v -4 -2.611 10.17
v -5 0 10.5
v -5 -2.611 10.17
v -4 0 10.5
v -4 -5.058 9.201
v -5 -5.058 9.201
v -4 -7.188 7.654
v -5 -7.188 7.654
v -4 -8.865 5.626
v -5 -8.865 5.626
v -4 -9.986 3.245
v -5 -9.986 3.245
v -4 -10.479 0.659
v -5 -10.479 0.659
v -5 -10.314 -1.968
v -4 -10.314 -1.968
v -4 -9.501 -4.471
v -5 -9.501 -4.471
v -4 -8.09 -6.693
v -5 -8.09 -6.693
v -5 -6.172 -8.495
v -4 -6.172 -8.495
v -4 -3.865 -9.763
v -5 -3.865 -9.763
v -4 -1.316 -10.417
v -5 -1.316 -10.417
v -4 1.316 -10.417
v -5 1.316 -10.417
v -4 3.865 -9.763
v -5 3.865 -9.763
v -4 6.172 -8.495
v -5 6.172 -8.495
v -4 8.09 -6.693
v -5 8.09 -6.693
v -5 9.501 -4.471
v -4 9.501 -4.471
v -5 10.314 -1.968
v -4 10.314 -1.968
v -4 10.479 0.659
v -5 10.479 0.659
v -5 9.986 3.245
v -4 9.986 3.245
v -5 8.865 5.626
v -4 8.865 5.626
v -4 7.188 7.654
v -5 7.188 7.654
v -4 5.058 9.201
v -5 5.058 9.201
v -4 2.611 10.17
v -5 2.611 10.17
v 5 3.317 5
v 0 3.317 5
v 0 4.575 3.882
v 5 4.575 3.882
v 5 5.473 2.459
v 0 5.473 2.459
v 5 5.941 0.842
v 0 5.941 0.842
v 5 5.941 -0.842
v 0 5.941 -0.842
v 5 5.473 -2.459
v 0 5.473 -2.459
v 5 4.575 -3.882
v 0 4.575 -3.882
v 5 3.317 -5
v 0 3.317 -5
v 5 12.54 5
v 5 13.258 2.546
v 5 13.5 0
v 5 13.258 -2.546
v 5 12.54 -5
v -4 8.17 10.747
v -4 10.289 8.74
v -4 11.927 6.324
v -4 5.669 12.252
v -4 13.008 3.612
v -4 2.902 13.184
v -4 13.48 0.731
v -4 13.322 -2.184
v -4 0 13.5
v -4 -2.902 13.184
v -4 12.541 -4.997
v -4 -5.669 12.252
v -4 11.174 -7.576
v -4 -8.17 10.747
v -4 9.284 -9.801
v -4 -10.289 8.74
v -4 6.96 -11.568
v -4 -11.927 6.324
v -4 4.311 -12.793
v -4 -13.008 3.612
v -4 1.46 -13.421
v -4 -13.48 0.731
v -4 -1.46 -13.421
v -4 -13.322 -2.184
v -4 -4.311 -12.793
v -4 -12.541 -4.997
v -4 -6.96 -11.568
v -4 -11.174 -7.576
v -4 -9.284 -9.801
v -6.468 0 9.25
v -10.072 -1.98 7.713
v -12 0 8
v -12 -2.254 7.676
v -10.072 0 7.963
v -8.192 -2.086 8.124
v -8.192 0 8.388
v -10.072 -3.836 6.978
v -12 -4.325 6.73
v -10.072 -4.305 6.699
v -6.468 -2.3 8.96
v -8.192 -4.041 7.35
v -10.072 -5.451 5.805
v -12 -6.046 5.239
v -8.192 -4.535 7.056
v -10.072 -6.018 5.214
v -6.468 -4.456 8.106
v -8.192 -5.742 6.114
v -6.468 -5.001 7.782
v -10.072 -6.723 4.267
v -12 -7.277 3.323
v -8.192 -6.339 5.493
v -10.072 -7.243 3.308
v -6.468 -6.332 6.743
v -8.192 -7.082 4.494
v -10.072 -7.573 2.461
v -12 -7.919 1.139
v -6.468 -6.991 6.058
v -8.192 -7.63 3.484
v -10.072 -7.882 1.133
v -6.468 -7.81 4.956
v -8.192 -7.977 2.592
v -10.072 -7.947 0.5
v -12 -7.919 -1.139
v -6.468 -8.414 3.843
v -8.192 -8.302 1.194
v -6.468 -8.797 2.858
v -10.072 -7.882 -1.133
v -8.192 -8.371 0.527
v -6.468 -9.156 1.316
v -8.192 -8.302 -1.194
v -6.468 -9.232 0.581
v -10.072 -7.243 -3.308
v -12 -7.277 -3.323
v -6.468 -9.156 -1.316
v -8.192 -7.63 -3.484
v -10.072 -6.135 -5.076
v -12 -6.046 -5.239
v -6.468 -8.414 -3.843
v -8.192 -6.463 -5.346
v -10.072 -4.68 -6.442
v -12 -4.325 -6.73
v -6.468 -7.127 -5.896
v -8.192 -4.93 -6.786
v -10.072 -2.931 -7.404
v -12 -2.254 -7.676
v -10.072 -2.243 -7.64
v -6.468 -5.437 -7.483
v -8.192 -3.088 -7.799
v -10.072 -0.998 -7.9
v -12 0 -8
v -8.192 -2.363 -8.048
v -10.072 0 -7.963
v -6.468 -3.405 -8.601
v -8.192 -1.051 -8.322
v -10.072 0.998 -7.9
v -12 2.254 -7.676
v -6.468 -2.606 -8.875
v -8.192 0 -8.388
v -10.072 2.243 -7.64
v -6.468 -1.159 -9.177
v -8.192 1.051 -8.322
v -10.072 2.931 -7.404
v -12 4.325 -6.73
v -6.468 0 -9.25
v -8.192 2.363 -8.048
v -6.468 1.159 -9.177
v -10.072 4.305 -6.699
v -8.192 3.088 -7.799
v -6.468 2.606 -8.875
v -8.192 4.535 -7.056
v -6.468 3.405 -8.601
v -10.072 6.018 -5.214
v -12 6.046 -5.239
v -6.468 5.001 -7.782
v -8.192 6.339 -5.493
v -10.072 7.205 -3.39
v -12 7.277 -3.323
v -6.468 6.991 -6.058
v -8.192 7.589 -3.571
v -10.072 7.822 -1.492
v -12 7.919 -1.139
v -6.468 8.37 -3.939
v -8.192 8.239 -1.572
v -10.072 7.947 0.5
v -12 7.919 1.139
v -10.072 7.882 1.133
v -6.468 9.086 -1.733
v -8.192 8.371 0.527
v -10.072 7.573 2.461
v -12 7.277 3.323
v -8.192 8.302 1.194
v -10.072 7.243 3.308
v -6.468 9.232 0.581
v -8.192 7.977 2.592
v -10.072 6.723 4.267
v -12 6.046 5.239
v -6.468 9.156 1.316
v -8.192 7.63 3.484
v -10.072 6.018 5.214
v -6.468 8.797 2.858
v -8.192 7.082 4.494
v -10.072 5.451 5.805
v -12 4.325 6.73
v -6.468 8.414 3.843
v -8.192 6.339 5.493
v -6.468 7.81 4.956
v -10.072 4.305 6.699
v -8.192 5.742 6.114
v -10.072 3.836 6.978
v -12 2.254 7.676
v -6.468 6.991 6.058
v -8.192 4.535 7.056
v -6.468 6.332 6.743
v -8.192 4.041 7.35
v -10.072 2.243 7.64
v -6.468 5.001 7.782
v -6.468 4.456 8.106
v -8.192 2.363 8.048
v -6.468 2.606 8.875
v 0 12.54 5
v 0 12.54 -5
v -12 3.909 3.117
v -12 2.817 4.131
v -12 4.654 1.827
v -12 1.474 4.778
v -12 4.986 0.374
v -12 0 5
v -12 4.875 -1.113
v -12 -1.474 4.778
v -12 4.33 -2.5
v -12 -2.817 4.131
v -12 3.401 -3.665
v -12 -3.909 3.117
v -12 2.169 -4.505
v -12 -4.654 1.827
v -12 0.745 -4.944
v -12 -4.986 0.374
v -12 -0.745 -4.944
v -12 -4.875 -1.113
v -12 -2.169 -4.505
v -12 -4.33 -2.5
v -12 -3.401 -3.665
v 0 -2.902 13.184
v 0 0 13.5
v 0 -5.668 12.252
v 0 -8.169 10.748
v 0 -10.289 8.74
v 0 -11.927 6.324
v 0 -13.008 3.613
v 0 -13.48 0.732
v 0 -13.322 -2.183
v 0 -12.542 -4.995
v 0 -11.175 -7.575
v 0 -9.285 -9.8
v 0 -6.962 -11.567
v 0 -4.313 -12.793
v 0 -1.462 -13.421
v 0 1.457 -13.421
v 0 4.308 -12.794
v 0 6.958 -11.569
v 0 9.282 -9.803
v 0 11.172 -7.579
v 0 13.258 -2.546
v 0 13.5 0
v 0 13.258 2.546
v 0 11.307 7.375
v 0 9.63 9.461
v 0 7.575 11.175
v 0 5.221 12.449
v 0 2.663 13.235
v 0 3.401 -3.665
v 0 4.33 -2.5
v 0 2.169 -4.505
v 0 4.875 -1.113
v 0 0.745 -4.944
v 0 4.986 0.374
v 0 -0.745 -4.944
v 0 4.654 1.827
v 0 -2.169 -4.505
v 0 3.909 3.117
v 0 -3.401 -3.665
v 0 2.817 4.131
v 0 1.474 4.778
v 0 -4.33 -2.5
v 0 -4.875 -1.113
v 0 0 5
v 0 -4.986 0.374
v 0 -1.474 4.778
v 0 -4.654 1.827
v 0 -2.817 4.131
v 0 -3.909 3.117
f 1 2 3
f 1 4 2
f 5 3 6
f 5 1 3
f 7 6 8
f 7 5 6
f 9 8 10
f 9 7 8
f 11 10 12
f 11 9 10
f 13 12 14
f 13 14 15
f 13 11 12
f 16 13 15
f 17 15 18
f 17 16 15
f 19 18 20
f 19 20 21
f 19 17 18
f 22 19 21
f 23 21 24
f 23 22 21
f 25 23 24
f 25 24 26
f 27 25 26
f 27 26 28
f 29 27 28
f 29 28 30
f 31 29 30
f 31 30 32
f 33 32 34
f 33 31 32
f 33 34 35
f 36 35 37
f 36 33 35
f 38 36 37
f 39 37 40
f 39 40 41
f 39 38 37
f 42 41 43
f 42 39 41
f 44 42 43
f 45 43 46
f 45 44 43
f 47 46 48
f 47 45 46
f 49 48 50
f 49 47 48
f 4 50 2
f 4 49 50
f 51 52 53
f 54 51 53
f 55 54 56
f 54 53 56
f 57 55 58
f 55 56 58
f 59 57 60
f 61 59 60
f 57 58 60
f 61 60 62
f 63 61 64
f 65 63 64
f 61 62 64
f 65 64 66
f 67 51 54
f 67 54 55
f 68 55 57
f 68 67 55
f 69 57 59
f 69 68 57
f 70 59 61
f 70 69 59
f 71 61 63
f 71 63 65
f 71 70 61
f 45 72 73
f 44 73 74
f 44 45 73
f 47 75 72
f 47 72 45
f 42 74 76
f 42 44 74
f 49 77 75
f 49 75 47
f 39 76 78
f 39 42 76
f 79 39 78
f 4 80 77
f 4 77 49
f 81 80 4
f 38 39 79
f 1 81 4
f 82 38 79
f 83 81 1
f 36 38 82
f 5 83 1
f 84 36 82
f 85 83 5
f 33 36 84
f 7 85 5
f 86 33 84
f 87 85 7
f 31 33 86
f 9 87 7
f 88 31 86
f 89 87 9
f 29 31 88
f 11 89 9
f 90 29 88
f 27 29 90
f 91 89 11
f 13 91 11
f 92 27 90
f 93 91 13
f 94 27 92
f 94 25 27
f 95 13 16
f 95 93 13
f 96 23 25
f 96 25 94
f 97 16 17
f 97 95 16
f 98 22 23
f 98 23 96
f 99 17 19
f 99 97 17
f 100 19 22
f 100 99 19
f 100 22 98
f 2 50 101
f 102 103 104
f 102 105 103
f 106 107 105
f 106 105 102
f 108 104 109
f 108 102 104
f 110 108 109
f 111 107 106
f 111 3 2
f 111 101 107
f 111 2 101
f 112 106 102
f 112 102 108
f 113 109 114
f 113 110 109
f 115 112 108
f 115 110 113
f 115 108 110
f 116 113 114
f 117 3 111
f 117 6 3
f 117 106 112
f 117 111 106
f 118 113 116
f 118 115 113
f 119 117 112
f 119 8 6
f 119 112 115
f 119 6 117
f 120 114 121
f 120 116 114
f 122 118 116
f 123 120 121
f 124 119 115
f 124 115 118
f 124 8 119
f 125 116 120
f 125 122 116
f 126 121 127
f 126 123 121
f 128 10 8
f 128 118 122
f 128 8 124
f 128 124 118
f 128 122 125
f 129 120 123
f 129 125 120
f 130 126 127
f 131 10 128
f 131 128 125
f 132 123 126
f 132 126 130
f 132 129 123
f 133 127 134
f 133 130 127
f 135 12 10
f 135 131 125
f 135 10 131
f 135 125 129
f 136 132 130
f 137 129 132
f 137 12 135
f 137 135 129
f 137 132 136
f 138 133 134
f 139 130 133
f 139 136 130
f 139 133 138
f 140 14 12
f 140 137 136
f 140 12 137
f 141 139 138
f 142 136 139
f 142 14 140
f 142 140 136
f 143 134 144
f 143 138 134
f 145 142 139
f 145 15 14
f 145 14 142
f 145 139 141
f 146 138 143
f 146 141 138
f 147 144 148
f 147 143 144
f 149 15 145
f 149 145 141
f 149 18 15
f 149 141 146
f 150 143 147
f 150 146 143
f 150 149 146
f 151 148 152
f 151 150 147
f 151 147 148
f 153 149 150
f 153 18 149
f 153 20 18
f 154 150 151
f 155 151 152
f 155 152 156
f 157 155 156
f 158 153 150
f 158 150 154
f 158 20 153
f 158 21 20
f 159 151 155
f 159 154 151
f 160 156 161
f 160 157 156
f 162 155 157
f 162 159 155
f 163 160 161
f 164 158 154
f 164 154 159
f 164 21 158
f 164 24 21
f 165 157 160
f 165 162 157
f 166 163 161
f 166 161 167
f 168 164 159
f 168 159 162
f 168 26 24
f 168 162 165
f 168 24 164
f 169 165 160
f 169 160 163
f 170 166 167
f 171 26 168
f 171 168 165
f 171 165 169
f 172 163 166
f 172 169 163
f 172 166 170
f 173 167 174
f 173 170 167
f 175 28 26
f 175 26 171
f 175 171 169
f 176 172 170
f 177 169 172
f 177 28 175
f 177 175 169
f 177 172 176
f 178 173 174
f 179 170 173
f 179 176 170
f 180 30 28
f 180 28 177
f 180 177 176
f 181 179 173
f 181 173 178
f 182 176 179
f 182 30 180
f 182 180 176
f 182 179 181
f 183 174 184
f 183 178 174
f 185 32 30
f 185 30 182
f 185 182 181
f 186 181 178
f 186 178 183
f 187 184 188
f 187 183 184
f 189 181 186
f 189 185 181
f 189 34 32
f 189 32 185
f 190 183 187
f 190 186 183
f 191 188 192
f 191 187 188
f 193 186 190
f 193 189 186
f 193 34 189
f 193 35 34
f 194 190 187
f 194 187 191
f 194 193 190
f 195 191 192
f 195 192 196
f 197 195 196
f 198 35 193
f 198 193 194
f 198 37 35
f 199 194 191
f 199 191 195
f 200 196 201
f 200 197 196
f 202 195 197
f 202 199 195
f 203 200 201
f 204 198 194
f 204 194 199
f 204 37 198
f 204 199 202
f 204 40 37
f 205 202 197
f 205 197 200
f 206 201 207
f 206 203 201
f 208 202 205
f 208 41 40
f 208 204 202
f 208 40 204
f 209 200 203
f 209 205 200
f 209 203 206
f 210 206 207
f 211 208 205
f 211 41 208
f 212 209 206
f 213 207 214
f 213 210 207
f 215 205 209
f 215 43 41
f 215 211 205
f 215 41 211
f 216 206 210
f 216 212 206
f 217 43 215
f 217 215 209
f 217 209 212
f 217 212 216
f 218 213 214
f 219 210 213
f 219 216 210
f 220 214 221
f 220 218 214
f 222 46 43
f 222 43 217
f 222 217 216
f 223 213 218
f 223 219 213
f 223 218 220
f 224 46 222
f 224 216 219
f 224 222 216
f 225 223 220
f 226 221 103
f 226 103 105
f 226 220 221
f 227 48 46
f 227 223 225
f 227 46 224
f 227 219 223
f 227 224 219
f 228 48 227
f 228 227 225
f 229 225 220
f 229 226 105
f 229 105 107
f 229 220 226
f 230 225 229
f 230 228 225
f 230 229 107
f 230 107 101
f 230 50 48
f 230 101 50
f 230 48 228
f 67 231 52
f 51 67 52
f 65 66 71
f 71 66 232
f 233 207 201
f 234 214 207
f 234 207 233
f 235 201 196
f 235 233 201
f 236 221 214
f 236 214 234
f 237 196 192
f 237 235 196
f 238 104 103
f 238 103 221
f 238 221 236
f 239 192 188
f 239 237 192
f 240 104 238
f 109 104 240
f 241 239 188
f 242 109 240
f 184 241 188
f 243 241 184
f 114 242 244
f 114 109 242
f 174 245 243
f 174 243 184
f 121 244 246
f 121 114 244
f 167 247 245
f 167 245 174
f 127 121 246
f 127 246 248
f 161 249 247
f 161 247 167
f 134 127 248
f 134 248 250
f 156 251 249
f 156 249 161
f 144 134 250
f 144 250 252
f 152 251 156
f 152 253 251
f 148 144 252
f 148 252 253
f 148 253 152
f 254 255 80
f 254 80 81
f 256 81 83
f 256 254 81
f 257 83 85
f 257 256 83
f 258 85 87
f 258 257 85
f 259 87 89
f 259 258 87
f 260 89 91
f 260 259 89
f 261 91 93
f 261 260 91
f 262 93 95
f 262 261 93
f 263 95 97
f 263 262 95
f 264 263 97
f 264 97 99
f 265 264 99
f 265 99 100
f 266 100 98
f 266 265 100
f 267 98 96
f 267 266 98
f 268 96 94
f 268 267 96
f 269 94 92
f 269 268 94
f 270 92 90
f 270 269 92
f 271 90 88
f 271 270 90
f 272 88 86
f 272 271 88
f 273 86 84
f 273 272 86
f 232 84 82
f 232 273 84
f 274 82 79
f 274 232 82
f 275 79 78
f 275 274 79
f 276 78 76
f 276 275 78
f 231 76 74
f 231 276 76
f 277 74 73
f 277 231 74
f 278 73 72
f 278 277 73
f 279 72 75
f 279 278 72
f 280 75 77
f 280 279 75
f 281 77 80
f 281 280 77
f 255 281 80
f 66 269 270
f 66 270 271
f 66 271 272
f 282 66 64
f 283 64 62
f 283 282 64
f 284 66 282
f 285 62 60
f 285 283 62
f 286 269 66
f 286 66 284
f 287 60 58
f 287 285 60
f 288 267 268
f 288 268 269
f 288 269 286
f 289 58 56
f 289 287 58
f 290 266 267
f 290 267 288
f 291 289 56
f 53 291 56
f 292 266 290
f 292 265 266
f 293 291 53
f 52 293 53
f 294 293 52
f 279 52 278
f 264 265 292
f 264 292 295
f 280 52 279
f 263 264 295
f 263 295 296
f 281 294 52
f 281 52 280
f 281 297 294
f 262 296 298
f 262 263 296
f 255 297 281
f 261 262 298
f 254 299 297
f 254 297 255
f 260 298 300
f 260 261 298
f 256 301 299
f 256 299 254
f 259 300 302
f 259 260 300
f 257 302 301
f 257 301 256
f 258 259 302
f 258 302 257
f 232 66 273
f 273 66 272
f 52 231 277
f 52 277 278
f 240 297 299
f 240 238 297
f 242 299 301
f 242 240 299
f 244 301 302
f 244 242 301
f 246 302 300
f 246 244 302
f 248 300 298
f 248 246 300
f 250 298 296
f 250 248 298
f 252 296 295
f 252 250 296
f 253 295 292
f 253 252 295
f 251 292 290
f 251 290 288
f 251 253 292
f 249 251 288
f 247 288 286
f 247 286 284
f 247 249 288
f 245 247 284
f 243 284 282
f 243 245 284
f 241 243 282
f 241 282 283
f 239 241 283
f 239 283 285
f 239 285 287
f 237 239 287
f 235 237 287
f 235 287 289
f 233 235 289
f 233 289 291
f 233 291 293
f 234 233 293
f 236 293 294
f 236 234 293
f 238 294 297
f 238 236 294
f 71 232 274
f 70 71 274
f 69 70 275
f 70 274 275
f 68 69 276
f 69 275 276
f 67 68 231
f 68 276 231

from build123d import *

# Parameters (mm, degrees)
EXTRUSION1_DEPTH = 5


with BuildPart() as part:
    # Esquisse1 → Révolution1 (revolve)
    with BuildSketch(Plane.XY, mode=Mode.PRIVATE) as r_volution1_sk:
        with BuildLine():
            Line((-12, 5), (-12, 8))
            ThreePointArc((-12, 8), (-8.192021355, 8.387659794), (-5, 10.5))
            Line((-5, 10.5), (-4, 10.5))
            Line((-4, 10.5), (-4, 13.5))
            Line((-4, 13.5), (0, 13.5))
            Line((0, 13.5), (0, 5))
            Line((0, 5), (-12, 5))
        make_face()
    revolve(r_volution1_sk.sketch.rotate(Axis((-16.08577031, 0, 0), (1, 0, 0)), 90), axis=Axis((-16.08577031, 0, 0), (1, 0, 0)))  # turned: the seam where the file's is

    # Esquisse2 → Extrusion1 (add)
    with BuildSketch(Plane(origin=(0, 0, 0), x_dir=(0, 0, -1), z_dir=(1, 0, 0))):
        with BuildLine():
            Line((-5, 12.539936204), (-5, 3.31662479))
            ThreePointArc((-5, 3.31662479), (0, 6), (5, 3.31662479))
            Line((5, 3.31662479), (5, 12.539936204))
            ThreePointArc((5, 12.539936204), (0, 13.5), (-5, 12.539936204))
        make_face()
    extrude(amount=EXTRUSION1_DEPTH)


solid = part.part
